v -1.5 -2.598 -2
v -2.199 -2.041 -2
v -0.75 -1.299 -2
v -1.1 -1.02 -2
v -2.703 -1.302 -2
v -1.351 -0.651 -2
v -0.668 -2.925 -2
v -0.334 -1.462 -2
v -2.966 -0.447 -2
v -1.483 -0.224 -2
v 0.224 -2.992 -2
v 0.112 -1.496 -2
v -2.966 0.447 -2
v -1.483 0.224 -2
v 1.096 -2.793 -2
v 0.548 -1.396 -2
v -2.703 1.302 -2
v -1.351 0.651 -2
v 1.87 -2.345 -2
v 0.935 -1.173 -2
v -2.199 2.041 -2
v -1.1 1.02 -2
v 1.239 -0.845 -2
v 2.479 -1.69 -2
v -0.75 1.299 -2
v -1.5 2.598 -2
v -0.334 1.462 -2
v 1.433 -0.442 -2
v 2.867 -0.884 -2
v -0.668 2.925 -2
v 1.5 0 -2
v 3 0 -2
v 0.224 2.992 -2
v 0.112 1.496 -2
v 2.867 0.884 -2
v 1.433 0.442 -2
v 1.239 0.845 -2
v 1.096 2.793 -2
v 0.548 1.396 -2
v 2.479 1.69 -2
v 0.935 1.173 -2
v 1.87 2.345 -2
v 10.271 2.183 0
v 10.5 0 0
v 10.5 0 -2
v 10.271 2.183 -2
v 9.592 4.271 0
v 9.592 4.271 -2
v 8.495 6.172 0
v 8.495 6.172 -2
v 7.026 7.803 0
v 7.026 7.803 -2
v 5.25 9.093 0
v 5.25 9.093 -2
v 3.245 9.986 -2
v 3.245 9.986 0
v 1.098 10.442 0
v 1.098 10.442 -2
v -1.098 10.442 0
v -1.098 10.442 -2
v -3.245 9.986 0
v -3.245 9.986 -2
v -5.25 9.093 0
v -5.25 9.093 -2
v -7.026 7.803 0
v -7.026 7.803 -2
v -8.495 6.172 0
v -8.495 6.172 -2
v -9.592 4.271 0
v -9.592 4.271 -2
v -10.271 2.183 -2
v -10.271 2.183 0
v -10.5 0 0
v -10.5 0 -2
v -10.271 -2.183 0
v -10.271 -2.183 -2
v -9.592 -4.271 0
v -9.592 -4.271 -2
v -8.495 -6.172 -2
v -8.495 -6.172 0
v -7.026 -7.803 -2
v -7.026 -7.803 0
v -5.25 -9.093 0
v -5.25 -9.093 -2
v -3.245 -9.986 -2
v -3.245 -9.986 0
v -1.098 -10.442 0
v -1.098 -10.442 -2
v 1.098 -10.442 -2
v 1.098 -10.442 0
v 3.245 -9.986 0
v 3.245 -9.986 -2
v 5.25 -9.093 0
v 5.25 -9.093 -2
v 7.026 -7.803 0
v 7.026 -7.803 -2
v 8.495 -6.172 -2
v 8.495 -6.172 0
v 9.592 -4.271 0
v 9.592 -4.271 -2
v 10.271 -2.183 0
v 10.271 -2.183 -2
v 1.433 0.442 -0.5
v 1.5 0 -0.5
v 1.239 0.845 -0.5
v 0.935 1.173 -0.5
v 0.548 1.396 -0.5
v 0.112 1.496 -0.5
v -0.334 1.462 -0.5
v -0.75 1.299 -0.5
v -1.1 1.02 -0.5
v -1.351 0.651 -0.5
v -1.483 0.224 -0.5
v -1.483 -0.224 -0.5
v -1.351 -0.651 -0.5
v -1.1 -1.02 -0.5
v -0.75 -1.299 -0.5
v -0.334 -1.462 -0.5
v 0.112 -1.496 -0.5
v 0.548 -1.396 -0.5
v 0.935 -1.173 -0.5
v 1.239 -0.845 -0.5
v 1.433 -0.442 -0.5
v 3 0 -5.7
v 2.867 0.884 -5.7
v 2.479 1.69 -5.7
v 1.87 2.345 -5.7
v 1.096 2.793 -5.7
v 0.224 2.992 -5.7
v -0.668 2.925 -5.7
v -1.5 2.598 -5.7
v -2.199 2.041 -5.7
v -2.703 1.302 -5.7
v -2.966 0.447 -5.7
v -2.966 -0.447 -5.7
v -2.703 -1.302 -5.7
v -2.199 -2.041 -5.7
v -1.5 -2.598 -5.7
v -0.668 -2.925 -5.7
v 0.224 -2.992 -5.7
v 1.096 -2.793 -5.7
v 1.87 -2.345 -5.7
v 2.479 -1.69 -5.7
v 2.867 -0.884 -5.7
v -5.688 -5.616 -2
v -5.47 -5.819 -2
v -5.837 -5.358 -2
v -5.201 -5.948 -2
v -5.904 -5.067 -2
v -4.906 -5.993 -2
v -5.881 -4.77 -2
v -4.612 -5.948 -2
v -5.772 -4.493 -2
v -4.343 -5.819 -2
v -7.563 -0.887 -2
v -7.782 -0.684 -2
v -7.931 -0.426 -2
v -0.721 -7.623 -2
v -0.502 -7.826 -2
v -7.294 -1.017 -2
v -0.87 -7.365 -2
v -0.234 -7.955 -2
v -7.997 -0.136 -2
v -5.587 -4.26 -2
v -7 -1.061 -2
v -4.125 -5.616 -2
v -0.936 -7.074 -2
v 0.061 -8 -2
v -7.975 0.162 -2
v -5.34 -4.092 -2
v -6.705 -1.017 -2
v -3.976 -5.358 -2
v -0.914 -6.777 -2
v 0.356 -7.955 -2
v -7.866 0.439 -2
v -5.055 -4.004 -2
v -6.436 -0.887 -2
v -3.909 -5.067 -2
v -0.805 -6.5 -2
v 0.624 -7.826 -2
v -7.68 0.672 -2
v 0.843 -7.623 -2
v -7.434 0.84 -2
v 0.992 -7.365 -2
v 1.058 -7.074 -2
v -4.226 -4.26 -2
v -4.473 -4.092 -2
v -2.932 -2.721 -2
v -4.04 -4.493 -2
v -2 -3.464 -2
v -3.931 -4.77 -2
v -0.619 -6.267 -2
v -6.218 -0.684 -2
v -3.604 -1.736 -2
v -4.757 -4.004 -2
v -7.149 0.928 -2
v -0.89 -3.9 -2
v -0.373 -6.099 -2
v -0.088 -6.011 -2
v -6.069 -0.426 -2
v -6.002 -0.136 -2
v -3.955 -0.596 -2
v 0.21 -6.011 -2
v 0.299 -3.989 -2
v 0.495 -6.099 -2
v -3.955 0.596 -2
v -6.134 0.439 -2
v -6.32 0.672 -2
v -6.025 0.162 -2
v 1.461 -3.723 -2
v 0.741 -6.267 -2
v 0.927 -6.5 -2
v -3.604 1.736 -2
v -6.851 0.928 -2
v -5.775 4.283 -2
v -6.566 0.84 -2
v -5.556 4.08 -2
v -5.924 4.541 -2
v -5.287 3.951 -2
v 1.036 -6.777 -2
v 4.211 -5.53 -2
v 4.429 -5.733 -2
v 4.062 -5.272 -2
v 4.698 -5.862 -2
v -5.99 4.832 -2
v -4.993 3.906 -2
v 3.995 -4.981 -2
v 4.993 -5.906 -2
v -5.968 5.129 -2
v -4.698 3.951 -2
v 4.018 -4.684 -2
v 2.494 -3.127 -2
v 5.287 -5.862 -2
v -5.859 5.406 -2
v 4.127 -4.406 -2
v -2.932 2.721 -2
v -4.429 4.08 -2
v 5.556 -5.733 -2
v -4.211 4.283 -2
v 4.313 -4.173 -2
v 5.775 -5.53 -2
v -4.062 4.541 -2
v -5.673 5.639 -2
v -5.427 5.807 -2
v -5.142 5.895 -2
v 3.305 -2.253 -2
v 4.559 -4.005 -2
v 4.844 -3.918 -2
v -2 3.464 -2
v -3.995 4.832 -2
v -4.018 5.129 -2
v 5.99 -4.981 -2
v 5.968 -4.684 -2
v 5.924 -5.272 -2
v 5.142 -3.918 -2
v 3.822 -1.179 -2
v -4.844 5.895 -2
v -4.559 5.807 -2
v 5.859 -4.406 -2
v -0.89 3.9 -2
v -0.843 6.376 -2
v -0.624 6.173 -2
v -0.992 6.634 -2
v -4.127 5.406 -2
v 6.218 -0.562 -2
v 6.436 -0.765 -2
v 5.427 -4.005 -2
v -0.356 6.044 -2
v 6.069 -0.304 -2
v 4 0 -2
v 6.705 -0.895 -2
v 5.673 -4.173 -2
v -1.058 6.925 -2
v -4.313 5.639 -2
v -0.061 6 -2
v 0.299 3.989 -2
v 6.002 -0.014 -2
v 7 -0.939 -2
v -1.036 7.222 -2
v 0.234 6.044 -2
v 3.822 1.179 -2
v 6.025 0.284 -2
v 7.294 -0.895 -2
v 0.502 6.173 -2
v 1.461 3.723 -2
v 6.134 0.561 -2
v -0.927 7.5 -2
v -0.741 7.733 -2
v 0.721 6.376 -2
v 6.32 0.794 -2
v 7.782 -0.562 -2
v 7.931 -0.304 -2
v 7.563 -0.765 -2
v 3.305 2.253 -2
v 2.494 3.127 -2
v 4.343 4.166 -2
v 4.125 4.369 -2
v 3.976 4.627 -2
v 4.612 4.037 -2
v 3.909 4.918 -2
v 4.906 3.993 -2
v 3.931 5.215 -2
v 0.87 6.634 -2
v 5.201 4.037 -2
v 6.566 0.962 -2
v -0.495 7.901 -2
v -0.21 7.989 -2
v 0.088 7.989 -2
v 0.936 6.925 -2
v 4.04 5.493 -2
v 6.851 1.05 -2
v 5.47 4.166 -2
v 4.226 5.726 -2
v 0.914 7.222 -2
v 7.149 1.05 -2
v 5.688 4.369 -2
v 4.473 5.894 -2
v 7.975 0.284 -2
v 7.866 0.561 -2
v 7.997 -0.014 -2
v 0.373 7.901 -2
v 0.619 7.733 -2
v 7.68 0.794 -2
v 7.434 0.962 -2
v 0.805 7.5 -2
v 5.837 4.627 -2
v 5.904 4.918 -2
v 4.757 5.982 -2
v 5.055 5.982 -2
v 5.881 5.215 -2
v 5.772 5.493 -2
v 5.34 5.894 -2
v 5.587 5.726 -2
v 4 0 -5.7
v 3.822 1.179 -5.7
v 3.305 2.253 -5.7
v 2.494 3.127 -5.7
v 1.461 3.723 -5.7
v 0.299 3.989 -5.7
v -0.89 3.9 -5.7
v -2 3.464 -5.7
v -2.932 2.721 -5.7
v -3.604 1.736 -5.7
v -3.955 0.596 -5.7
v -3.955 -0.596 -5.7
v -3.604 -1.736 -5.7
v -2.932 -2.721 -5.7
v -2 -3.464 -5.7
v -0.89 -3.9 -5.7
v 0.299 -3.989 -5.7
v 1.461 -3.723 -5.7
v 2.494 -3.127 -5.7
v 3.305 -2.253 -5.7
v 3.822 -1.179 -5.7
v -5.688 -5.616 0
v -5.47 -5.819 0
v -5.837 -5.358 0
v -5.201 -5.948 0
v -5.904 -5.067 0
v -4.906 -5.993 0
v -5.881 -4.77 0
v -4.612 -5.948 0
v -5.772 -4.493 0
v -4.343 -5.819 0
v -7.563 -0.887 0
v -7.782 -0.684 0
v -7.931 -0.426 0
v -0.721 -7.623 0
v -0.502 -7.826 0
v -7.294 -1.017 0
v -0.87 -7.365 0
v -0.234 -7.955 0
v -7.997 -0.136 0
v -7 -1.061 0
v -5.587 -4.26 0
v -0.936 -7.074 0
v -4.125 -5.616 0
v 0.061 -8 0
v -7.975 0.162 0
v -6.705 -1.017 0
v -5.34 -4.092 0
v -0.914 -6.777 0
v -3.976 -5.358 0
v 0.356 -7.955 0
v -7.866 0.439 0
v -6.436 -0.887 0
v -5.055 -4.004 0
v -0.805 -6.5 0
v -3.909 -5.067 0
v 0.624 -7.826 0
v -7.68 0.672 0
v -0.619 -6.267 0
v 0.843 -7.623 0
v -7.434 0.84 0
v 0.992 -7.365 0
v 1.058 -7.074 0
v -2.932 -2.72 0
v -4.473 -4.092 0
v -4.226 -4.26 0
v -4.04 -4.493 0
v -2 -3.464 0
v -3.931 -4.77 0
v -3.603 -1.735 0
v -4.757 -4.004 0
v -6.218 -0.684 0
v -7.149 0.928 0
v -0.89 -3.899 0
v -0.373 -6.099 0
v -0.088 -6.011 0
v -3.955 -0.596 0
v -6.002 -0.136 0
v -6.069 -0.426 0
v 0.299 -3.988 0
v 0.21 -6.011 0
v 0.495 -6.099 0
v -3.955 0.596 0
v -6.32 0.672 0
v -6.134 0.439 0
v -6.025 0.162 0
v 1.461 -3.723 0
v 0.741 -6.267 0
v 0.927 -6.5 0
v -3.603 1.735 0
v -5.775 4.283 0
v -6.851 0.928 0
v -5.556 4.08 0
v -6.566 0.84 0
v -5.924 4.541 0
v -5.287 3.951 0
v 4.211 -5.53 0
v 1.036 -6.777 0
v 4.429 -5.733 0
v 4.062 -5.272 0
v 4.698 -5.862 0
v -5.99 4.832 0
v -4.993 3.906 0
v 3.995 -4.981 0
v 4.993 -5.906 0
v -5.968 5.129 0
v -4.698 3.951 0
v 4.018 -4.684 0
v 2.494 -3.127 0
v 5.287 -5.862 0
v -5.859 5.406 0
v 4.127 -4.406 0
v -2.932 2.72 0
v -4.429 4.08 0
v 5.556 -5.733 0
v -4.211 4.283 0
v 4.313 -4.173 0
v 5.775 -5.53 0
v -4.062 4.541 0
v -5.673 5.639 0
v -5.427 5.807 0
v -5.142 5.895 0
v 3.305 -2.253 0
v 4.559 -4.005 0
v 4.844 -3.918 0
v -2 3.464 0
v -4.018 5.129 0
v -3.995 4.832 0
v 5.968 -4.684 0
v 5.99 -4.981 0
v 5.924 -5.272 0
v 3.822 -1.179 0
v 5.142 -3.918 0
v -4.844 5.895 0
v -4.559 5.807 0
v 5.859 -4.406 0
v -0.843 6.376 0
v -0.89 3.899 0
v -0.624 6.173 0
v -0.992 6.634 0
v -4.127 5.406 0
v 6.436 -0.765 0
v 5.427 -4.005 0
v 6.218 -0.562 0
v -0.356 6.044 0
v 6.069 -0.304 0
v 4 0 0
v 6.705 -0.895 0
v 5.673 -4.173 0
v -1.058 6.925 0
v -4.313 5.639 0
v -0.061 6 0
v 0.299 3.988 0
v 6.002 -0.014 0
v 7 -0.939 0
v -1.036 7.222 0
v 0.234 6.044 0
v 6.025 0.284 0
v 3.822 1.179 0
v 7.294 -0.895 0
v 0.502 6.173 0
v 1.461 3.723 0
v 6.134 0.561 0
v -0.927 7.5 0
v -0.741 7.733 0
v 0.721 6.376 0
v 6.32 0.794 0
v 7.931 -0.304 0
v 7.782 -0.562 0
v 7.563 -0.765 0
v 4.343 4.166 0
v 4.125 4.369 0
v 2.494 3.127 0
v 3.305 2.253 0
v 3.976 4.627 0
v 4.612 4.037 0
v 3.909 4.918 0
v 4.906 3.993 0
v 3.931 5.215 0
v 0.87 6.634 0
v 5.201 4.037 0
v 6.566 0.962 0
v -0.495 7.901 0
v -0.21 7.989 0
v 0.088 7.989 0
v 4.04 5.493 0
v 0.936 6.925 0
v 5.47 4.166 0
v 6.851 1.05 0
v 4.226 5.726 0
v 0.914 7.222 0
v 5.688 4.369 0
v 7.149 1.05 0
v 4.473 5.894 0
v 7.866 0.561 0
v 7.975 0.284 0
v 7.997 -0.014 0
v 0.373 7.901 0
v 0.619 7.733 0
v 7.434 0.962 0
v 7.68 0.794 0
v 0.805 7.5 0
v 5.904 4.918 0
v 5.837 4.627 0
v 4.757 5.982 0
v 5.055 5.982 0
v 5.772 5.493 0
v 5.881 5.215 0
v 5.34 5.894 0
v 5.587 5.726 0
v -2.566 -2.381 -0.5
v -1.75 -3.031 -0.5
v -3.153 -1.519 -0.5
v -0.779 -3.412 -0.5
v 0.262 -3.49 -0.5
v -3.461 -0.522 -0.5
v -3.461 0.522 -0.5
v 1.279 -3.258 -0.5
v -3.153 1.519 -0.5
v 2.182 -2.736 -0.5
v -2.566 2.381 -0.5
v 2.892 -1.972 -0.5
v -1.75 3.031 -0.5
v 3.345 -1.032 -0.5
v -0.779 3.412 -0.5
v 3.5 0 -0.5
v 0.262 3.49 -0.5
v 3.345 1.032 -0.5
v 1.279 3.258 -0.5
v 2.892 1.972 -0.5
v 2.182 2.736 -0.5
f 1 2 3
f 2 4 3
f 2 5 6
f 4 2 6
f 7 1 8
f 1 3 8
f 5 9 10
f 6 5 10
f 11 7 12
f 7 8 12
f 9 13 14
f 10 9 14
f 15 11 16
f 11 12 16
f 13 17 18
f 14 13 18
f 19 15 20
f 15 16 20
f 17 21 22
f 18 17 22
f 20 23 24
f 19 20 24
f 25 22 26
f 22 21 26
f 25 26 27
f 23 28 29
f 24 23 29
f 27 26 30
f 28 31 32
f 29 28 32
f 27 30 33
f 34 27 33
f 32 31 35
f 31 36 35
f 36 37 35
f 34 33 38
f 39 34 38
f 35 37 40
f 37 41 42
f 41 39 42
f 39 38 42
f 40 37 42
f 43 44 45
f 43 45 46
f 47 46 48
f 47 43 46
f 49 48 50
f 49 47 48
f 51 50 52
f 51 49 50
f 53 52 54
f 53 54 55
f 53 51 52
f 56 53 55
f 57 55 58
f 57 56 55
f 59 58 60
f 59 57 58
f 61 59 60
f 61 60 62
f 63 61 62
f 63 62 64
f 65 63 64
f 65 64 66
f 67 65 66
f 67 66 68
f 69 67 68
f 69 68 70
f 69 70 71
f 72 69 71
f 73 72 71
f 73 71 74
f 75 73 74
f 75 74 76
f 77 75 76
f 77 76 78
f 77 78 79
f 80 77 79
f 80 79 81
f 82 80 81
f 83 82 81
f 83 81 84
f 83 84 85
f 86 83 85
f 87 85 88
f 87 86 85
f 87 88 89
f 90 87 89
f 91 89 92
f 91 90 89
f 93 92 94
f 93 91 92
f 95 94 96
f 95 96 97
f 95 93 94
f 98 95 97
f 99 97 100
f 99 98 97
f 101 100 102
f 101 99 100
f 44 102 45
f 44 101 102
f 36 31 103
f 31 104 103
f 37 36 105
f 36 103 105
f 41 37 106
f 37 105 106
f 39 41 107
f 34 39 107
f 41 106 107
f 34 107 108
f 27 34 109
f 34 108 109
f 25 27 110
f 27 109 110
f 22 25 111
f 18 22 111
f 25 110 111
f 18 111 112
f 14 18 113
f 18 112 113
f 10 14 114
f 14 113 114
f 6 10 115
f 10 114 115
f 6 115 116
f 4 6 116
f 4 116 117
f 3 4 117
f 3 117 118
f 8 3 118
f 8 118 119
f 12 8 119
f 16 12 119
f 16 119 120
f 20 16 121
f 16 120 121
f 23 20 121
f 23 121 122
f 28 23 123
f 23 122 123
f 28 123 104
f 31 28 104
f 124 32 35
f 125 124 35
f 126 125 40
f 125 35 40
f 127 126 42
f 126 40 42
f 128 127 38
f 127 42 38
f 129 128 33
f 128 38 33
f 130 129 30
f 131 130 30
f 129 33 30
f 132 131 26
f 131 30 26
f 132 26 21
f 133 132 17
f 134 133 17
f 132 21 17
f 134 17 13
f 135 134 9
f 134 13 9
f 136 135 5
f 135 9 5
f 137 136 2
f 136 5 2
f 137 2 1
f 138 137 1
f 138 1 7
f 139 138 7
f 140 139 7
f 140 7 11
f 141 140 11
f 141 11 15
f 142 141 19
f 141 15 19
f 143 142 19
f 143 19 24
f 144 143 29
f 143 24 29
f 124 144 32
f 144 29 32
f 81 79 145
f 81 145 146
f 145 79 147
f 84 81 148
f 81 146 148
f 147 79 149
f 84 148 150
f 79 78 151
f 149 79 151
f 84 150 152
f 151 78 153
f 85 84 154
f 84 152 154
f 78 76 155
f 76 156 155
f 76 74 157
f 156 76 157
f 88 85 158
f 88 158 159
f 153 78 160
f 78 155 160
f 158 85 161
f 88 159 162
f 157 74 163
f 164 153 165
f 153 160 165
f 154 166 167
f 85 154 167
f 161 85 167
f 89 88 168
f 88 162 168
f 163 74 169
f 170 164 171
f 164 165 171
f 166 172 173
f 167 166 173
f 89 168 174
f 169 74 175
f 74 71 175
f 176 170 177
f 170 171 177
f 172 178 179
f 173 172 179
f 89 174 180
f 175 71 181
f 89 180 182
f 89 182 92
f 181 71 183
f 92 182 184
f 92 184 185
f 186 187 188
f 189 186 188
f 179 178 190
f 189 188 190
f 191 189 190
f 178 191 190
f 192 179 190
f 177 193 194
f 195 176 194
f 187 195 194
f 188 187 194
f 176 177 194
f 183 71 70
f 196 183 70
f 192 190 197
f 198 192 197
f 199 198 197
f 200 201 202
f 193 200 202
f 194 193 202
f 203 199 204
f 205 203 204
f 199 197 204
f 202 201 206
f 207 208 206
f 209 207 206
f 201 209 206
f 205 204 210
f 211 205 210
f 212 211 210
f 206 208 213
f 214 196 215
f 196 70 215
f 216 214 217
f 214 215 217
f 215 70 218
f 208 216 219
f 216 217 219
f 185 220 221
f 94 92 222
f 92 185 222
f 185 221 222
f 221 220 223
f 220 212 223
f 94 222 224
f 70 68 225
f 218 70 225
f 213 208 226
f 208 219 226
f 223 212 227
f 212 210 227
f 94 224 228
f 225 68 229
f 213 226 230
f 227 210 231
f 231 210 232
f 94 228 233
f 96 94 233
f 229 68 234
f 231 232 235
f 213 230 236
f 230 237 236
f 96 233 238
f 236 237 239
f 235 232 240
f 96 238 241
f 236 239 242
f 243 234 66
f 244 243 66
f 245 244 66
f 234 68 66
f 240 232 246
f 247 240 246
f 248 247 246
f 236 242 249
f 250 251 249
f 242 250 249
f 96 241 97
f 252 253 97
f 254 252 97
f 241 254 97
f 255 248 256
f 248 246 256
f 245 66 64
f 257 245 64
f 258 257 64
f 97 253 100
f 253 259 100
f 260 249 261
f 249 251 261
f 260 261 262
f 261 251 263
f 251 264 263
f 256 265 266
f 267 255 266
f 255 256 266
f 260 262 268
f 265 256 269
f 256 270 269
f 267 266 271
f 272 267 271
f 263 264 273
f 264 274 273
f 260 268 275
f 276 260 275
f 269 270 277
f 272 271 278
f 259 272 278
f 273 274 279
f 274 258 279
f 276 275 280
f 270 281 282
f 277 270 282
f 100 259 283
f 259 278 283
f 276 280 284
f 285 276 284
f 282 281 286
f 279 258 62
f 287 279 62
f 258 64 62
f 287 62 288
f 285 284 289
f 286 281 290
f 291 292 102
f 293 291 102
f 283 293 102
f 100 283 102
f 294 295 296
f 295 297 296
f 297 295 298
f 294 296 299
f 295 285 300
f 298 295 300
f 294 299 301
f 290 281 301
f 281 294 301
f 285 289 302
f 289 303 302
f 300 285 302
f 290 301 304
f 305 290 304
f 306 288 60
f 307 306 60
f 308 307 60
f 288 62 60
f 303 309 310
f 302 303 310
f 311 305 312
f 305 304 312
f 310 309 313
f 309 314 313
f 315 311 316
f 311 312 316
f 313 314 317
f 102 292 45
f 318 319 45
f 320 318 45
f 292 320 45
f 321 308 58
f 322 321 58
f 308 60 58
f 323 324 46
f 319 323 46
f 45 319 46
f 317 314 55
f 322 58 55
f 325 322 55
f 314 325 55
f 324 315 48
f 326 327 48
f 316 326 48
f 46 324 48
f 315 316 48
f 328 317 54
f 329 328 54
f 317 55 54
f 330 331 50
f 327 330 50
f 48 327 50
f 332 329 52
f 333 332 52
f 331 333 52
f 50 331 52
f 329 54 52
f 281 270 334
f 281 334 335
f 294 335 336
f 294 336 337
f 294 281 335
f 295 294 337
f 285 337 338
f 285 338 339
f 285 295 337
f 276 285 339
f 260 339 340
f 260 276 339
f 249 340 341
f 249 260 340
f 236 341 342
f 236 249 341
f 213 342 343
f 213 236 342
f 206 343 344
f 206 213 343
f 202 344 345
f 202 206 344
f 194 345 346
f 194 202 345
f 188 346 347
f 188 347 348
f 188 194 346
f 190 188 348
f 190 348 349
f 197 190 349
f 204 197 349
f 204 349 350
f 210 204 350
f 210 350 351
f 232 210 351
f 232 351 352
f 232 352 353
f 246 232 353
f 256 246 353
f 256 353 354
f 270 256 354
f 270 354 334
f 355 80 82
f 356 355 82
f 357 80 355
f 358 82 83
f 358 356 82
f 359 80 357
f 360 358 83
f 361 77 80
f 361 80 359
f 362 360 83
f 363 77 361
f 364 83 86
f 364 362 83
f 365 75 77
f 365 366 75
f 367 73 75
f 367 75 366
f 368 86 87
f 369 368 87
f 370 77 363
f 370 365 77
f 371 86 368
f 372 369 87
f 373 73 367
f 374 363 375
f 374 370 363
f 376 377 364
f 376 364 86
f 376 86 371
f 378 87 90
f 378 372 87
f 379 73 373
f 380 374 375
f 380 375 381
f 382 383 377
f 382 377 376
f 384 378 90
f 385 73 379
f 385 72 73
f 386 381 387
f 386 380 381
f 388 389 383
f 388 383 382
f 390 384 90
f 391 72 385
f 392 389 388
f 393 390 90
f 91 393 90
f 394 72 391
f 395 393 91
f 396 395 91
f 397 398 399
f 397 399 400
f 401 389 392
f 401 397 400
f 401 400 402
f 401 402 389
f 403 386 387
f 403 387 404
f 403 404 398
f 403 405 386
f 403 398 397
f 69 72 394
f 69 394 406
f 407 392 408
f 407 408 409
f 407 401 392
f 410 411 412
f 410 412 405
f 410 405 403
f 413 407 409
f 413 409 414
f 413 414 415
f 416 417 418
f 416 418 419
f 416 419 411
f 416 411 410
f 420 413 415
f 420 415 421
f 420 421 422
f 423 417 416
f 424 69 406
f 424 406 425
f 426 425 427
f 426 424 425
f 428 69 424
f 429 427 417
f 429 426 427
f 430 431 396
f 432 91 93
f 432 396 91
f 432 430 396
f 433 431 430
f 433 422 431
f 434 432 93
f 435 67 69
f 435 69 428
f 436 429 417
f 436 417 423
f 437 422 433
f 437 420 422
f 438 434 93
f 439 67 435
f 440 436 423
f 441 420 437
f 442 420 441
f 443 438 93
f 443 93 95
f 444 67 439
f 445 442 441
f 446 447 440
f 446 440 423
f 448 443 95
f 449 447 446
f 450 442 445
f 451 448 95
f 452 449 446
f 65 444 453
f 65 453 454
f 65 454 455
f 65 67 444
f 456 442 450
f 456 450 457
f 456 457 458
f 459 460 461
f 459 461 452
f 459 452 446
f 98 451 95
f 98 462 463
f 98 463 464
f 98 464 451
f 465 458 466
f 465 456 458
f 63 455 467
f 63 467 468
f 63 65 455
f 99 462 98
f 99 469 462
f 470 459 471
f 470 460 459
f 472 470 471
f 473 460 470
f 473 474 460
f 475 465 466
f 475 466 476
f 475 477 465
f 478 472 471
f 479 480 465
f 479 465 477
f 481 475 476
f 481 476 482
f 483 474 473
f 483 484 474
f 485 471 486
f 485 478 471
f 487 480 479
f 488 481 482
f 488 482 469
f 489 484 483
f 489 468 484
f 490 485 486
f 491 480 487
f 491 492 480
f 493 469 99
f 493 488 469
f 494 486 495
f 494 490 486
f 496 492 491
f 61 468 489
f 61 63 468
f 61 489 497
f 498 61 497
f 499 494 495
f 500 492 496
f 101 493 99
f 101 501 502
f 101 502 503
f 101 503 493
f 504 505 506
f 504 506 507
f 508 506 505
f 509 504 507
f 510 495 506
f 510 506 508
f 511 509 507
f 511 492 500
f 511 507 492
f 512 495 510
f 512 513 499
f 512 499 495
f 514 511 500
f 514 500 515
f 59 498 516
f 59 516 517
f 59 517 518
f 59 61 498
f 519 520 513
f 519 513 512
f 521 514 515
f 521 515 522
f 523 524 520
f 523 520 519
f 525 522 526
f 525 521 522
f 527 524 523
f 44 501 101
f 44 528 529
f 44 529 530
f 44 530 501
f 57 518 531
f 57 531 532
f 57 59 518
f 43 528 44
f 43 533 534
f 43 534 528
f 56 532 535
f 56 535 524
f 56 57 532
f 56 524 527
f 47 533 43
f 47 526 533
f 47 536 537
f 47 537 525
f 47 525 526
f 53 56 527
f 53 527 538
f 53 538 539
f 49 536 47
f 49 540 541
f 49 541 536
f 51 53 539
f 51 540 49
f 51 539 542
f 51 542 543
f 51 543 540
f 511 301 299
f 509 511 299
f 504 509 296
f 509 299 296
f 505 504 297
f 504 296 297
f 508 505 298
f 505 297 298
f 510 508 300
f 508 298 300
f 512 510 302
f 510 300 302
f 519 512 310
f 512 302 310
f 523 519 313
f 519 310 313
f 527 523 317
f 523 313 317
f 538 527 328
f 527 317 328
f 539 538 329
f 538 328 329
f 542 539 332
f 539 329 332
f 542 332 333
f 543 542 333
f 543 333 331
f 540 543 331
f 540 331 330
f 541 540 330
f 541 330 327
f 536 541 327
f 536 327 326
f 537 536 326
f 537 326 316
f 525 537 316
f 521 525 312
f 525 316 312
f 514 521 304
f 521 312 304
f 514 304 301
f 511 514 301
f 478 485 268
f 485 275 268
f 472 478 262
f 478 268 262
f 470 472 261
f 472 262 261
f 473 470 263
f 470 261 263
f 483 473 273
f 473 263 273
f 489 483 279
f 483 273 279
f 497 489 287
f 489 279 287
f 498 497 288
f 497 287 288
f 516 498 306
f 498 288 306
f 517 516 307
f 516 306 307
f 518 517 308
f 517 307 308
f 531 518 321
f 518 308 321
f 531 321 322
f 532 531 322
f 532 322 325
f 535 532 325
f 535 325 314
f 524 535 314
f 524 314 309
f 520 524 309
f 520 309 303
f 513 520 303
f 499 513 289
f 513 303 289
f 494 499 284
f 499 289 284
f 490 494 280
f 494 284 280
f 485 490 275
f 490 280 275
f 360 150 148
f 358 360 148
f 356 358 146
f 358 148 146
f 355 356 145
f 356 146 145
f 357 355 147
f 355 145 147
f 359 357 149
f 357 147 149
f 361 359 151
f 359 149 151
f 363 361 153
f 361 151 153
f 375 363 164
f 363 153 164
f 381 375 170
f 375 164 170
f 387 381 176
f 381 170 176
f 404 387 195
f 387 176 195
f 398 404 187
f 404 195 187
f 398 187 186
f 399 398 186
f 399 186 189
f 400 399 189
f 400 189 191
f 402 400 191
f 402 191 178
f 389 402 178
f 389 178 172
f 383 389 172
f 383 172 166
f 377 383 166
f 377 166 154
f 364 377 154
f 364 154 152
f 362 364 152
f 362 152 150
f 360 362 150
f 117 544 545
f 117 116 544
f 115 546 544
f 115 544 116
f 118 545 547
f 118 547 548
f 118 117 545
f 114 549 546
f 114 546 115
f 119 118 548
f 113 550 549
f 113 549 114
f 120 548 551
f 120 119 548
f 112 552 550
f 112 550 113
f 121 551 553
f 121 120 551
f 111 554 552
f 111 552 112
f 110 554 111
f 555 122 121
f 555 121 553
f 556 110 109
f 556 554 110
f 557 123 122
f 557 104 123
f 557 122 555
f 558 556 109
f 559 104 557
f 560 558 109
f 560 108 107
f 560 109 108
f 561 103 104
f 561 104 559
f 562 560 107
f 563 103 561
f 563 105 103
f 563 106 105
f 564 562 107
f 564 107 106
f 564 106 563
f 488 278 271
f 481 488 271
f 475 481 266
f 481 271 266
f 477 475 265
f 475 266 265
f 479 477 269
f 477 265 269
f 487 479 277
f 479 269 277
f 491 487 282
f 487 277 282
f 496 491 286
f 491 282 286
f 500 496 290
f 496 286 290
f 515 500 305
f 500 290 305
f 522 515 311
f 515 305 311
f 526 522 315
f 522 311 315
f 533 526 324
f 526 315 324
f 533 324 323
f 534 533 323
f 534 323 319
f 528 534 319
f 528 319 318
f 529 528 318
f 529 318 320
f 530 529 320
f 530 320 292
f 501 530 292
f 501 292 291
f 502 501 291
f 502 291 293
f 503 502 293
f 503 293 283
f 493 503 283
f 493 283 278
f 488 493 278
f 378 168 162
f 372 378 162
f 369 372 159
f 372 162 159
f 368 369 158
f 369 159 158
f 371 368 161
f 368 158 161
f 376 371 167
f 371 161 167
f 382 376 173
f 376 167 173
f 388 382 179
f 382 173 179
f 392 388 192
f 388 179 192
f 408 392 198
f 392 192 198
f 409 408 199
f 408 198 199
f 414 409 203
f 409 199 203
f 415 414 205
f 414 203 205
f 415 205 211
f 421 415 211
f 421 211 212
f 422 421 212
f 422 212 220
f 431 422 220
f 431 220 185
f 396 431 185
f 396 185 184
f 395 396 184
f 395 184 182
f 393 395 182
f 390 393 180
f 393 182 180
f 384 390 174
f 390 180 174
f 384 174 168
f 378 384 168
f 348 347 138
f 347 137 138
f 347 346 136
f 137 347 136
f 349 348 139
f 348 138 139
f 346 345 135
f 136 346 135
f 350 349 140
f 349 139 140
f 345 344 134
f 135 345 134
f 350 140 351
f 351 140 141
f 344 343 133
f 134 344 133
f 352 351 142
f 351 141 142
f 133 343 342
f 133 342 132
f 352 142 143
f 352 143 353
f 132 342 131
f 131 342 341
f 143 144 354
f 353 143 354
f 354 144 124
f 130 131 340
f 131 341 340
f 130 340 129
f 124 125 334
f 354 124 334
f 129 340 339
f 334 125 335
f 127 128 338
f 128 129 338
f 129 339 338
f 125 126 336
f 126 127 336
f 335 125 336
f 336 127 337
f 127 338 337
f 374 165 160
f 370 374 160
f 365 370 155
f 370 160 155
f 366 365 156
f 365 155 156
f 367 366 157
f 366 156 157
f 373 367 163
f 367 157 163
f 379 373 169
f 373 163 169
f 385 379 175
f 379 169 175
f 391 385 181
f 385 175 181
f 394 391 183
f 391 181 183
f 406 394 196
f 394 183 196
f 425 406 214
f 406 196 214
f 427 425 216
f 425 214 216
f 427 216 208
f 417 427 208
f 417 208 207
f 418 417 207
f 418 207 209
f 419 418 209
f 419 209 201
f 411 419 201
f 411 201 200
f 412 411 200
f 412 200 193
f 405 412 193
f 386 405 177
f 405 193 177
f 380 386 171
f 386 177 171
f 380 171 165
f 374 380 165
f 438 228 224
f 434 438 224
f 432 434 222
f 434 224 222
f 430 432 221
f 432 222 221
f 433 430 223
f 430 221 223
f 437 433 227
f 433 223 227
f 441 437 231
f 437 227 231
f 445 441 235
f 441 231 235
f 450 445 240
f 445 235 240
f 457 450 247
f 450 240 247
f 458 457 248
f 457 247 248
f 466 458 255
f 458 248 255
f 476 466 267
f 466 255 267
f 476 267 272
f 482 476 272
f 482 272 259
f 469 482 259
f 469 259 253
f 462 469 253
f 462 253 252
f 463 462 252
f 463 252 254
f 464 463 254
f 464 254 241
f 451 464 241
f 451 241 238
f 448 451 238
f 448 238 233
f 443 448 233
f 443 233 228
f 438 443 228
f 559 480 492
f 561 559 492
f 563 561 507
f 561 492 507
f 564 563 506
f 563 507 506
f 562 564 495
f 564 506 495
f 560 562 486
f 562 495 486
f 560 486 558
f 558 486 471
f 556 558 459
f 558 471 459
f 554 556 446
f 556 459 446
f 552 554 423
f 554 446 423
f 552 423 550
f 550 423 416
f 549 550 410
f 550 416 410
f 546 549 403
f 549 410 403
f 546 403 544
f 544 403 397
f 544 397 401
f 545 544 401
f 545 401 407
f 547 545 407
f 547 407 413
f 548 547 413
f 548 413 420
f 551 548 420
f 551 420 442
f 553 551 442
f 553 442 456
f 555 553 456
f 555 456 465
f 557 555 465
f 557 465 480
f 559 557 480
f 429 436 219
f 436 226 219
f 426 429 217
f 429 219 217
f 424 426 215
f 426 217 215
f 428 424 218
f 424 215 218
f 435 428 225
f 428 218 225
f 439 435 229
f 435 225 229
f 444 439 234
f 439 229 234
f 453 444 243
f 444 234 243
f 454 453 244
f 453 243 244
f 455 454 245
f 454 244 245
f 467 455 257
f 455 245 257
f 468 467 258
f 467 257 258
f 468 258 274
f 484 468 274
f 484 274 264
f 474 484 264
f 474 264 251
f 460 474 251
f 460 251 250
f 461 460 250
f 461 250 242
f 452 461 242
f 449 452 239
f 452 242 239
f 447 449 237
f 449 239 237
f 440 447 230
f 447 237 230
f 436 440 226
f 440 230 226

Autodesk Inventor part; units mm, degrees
ref_plane "YZ Plane" through (0, 0, 0) normal (1, 0, 0) x (0, 1, 0)
ref_plane "XZ Plane" through (0, 0, 0) normal (0, 1, 0) x (-1, 0, 0)
ref_plane "XY Plane" through (0, 0, 0) normal (0, 0, 1) x (1, 0, 0)
sketch "スケッチ1" plane through (0, 0, 0) normal (0, 0, 1) x (1, 0, 0)
  circle A0 centre (0, 0) radius 10.5
  circle A1 centre (0, 0) radius 3.5
  circle A2 centre (0, 0) radius 7 construction
  circle A3 centre (0, 0) radius 7 construction
  circle A4 centre (0, 0) radius 7 construction
  circle A5 centre (0, 0) radius 7 construction
  circle A6 centre (0, 0) radius 7 construction
  circle A7 centre (0, 0) radius 7 construction
  circle A8 centre (0, 0) radius 7 construction
  circle A9 centre (0, 0) radius 7 construction
  circle A10 centre (0, 0) radius 4
  circle A11 centre (0, 0) radius 1.5
  circle A12 centre (0, 0) radius 3
  point P0 (-0.061, 6.9997)
  point P1 (-4.9927, 4.9064)
  point P2 (-6.9997, -0.061)
  point P3 (-4.9064, -4.9927)
  point P4 (0.061, -6.9997)
  point P5 (4.9927, -4.9064)
  point P6 (6.9997, 0.061)
  point P7 (4.9064, 4.9927)
  dimension "d2" = 14
  dimension "d0" = 21
  dimension "d1" = 7
  dimension "d5" = 360
  dimension "d7" = 8
  dimension "d8" = 3
  dimension "d11" = 6
extrude "押し出し1" add sketch "スケッチ1" against normal blind 2 contours A0 | A1 | A10 | A12
extrude "押し出し2" add sketch "スケッチ1" against normal blind 5.7 contours A1 | A10
extrude "押し出し3" cut sketch "スケッチ1" against normal blind 0.5 contours A1 | A12
chamfer "面取り1" distance 0.5 angle 45 1 edges at (-3.5, 0, 0)
hole "穴1" at (-0.061, 6.9997, 0) at (-4.9927, 4.9064, 0) at (-6.9997, -0.061, 0) at (-4.9064, -4.9927, 0) at (0.061, -6.9997, 0) at (4.9927, -4.9064, 0) at (6.9997, 0.061, 0) at (4.9064, 4.9927, 0) direction (0, 0, -1) diameter 2 end through all
sketch "スケッチ2" plane through (0, 0, 0) normal (0, 0, 1) x (1, 0, 0)
  circle A0 centre (4.9064, 4.9927) radius 1 projected
  circle A1 centre (6.9997, 0.061) radius 1 projected
  circle A2 centre (4.9927, -4.9064) radius 1 projected
  circle A3 centre (0.061, -6.9997) radius 1 projected
  circle A4 centre (-4.9064, -4.9927) radius 1 projected
  circle A5 centre (-6.9997, -0.061) radius 1 projected
  circle A6 centre (-4.9927, 4.9064) radius 1 projected
  circle A7 centre (-0.061, 6.9997) radius 1 projected
  circle A8 centre (0, 0) radius 10.5 projected
  circle A9 centre (0, 0) radius 4 projected
  circle A10 centre (0, 0) radius 8
  circle A11 centre (-0.061, 6.9997) radius 1 projected
  dimension "d26" = 16
properties part number "servohorn_zegi" material "アルミニウム 6061-AHC"
